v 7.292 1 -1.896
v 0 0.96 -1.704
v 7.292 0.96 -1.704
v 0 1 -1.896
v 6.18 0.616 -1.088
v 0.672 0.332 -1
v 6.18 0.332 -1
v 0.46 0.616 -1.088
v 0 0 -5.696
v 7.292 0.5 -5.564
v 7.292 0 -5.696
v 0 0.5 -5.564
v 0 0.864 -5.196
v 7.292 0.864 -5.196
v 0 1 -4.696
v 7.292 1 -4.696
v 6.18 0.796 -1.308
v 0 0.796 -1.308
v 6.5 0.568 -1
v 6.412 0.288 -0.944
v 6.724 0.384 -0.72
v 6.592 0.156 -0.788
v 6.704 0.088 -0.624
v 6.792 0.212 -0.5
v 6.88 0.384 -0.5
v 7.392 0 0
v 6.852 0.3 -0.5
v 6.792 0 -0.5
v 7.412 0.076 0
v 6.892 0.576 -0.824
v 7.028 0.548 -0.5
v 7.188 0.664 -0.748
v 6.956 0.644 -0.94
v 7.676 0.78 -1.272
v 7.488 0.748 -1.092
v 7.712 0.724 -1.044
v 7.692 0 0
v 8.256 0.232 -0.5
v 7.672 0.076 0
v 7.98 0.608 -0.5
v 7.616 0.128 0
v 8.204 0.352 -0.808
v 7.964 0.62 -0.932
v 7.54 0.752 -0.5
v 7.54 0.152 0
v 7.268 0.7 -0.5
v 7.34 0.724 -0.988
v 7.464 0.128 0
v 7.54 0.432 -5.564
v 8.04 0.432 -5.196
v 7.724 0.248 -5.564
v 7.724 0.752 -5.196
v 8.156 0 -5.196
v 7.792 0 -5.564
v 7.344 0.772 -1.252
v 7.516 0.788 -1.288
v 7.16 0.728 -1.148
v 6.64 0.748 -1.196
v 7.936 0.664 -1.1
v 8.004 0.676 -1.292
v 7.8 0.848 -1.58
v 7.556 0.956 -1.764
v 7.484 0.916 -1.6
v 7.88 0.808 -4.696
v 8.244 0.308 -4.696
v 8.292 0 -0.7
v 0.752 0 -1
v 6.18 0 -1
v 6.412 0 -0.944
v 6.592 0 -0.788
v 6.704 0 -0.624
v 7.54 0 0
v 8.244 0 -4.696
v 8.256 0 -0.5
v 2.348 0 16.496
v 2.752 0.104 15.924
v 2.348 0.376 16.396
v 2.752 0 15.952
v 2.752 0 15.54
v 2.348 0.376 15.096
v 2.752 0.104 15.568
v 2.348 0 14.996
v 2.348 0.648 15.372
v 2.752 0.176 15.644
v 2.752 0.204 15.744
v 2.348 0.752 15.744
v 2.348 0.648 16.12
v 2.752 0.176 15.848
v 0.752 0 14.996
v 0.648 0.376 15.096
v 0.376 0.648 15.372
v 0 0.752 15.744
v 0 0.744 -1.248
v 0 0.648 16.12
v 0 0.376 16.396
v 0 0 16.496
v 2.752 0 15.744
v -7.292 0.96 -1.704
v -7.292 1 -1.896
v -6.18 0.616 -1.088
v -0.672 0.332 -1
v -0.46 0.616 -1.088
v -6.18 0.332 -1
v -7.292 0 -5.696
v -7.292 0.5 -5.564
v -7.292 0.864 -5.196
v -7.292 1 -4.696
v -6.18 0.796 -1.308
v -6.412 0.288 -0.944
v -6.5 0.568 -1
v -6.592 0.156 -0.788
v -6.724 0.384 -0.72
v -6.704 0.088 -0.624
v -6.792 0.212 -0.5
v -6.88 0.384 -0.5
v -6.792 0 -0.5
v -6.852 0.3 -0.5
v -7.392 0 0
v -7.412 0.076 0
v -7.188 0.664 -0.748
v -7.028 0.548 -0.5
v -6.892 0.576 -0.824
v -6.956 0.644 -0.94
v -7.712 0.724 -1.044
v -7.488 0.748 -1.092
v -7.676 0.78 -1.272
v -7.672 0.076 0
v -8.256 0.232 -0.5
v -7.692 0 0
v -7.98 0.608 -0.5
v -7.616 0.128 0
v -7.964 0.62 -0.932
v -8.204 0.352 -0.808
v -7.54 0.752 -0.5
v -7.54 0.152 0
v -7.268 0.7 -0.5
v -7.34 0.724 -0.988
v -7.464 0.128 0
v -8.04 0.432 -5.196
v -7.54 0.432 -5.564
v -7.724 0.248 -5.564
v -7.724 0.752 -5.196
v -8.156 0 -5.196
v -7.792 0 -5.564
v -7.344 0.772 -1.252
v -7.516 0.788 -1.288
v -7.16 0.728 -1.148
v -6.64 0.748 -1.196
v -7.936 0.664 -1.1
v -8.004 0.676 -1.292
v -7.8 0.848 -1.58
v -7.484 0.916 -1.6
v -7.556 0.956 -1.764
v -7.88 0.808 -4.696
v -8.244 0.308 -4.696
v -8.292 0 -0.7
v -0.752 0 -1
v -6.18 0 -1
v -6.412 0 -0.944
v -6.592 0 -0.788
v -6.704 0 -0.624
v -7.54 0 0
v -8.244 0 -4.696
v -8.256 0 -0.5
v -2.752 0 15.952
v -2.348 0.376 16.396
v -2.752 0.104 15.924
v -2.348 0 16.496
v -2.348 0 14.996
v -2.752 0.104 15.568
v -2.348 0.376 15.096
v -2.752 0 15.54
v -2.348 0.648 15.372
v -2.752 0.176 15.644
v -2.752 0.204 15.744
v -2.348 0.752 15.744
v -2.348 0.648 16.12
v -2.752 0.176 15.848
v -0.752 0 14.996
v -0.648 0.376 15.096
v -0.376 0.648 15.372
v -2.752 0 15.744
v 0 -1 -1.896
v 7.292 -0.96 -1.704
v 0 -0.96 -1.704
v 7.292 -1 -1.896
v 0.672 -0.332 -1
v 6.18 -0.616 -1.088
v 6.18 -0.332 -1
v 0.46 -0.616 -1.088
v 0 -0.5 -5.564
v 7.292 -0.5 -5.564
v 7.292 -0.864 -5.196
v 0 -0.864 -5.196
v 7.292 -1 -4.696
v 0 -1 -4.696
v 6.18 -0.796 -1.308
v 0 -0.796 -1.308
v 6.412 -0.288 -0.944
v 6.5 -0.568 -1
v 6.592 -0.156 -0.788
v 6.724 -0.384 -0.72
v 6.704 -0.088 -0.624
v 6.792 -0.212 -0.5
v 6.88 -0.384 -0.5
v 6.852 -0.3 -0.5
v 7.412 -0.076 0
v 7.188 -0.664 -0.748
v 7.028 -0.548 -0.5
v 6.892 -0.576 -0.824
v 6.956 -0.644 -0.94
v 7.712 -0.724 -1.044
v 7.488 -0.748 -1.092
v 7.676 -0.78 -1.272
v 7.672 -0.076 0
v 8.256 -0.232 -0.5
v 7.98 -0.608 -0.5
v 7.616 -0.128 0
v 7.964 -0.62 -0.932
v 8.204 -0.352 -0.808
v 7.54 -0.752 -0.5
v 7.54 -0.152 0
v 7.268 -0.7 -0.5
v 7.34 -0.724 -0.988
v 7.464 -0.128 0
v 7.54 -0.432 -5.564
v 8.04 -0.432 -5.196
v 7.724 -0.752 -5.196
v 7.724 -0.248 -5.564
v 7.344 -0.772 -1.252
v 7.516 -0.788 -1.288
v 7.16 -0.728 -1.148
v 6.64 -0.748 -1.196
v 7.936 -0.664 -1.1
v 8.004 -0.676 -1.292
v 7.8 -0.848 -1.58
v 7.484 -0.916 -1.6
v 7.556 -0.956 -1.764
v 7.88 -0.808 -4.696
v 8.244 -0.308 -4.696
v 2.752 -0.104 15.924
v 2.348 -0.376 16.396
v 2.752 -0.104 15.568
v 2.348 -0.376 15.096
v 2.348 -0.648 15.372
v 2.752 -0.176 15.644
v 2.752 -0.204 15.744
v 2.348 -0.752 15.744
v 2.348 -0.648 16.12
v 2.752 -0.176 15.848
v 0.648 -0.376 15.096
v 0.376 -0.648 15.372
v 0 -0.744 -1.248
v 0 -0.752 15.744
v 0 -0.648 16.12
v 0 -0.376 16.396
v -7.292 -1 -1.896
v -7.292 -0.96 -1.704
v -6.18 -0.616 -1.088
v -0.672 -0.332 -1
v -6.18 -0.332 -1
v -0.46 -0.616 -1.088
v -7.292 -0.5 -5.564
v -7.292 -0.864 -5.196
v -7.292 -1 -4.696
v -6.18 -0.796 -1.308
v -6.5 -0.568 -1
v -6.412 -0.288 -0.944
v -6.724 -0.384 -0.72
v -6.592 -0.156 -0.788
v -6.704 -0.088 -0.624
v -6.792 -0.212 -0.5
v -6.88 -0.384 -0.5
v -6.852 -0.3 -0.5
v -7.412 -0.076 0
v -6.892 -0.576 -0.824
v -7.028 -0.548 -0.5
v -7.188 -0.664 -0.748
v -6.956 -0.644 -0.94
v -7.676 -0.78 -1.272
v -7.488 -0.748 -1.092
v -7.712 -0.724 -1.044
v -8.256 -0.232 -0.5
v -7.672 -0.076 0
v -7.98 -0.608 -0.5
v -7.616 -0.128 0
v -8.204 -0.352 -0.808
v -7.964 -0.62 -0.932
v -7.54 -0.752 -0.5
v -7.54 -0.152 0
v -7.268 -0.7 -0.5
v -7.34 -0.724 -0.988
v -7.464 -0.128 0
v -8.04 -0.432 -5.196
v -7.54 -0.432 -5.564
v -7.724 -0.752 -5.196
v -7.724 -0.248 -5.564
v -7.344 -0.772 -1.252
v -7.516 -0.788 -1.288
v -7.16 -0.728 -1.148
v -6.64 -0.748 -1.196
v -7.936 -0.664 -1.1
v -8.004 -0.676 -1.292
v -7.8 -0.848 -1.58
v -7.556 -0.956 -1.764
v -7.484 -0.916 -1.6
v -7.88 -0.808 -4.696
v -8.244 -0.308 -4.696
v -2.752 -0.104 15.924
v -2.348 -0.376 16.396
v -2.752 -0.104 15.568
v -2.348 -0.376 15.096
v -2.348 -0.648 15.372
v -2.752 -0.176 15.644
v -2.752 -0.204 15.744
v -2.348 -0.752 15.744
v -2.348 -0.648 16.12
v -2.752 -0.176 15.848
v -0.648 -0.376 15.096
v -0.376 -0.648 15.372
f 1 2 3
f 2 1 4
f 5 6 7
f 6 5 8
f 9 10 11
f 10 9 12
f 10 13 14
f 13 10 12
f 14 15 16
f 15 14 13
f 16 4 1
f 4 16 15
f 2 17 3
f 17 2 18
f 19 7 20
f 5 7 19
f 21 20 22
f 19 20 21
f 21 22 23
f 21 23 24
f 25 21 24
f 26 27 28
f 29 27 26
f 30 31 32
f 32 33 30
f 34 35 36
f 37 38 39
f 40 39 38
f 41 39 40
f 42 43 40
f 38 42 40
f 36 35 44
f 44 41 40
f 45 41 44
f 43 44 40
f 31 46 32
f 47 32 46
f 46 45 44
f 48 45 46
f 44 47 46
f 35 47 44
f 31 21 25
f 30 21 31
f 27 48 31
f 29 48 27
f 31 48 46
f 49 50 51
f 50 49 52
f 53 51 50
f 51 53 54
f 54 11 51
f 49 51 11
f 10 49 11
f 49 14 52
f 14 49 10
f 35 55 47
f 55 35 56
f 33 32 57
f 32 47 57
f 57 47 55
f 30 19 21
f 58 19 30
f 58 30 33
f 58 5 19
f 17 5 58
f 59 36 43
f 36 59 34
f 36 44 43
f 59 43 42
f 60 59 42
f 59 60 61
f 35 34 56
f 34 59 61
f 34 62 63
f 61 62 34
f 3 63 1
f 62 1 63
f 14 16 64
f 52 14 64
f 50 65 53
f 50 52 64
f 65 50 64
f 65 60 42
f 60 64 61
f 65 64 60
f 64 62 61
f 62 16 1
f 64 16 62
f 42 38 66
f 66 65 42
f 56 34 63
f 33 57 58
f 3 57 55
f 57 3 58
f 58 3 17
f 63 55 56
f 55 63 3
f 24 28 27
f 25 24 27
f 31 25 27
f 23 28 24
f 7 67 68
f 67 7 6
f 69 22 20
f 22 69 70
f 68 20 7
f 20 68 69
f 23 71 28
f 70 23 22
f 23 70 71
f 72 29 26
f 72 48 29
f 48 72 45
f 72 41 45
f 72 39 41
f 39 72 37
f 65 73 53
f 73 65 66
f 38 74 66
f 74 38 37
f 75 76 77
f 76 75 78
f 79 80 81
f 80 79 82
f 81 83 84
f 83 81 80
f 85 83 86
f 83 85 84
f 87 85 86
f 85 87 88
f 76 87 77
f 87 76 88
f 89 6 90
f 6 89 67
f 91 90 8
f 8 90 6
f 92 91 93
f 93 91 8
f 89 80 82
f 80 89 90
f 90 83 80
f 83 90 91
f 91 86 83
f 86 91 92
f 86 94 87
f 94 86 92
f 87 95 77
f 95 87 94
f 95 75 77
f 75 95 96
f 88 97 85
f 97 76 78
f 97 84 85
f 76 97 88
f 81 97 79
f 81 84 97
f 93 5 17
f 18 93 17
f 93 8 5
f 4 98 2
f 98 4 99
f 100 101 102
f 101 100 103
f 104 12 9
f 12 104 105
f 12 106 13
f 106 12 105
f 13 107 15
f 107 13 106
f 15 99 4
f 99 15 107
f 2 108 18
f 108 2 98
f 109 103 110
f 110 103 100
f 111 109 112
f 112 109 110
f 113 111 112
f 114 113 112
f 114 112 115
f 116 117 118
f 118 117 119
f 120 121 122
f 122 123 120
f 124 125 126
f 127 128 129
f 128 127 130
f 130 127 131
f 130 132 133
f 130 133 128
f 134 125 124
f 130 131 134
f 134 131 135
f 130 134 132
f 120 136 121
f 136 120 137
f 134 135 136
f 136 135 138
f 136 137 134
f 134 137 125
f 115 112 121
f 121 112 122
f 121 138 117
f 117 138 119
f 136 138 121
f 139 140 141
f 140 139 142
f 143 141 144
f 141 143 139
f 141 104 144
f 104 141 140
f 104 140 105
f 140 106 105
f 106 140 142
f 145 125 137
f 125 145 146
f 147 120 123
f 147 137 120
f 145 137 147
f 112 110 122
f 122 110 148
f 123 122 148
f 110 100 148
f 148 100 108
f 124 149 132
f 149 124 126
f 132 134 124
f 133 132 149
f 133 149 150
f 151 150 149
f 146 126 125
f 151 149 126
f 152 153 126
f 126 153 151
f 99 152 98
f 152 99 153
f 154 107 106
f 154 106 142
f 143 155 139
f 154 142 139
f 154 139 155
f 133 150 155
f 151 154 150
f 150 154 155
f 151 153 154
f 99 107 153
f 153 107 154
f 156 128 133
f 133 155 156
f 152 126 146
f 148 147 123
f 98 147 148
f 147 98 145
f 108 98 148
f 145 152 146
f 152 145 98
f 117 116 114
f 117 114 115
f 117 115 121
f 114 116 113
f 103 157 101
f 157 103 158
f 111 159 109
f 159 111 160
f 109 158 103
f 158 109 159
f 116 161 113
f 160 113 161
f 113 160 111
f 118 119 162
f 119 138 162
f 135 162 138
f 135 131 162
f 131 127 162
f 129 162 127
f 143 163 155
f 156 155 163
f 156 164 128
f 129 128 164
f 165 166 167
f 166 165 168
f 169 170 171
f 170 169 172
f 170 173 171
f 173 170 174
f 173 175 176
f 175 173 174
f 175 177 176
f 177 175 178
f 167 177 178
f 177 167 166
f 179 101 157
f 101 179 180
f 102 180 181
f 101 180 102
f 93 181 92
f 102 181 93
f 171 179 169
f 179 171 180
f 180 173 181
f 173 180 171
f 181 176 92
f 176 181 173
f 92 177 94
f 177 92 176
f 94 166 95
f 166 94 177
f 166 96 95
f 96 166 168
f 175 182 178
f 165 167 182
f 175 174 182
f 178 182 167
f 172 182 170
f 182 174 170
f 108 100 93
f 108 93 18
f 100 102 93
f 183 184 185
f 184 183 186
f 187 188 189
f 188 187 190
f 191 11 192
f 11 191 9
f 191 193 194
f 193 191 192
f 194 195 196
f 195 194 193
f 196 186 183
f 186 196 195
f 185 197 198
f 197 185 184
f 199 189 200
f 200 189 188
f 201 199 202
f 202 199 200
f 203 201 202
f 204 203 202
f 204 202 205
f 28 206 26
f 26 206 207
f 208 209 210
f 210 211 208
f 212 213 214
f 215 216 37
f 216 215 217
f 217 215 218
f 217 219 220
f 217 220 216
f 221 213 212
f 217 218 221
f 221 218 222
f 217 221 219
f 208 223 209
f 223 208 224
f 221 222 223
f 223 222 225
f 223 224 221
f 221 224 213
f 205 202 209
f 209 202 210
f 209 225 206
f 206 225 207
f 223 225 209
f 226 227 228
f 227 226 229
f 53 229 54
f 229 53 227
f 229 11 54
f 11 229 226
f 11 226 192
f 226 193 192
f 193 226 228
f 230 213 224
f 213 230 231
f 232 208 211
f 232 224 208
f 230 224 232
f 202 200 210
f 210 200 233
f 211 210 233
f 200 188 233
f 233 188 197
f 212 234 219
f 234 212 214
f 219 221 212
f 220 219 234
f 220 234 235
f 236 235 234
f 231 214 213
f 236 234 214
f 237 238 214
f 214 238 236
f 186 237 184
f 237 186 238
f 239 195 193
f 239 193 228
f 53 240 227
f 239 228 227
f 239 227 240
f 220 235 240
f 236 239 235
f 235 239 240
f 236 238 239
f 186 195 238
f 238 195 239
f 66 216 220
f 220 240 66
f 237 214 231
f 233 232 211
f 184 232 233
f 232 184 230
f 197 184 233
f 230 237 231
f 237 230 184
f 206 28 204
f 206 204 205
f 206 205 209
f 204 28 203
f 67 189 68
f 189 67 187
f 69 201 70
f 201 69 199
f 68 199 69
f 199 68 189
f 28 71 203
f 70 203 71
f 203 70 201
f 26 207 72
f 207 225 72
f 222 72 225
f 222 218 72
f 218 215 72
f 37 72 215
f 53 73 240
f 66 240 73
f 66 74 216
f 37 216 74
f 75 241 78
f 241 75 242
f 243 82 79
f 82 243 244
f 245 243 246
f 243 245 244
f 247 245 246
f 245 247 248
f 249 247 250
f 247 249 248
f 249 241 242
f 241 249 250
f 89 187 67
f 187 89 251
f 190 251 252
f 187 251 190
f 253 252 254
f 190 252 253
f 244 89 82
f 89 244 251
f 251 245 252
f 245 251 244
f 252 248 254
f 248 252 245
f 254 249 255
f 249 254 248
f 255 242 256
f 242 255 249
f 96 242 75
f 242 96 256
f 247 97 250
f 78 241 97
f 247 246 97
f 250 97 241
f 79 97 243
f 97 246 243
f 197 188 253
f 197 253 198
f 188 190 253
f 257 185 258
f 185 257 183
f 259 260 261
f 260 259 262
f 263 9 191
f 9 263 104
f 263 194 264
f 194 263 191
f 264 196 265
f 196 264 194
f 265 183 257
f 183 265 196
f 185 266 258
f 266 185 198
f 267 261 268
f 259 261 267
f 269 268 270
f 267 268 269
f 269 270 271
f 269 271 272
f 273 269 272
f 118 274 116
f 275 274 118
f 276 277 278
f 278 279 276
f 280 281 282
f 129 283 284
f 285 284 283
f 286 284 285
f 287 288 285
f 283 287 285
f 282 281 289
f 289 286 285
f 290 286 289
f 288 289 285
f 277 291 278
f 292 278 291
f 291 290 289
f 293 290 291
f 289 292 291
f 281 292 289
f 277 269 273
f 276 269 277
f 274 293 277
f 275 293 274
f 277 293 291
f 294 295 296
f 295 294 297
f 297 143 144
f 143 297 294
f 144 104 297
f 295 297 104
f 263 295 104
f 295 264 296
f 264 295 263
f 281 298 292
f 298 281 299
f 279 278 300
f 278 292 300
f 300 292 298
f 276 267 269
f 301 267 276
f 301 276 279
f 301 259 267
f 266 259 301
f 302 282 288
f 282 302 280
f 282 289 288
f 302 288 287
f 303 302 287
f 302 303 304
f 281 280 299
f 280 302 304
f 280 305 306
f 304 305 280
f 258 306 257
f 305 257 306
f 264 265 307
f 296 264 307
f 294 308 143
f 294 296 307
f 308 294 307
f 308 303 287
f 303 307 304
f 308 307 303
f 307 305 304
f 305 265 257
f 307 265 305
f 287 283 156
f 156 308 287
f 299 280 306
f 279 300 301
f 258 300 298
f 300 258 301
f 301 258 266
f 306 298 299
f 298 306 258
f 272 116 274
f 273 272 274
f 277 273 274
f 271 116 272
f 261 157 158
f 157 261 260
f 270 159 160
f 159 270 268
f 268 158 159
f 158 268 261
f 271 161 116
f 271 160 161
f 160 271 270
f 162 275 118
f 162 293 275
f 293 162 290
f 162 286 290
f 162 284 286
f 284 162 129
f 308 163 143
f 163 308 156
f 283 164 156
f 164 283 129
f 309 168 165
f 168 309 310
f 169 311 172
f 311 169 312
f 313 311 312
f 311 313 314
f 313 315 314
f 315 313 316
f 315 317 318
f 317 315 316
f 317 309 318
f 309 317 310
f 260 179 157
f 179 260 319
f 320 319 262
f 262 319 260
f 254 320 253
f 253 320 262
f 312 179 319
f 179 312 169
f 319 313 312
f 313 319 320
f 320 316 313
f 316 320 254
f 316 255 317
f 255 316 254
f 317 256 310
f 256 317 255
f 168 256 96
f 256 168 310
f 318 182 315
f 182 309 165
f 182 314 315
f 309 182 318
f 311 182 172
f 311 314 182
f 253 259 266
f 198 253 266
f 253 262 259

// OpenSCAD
use <../lib.scad>
use <s/40359bs01.scad>
$fa=1; $fs=0.2;
function ldraw_lib__40359b(realsolid=false) = [
// 0 ~Sprue for 2 Minifig Keys
// 0 Name: 40359b.dat
// 0 Author: Andy Westrate [westrate]
// 0 !LDRAW_ORG Part UPDATE 2020-02
// 0 !LICENSE Licensed under CC BY 2.0 and CC BY 4.0 : see CAreadme.txt
// 
// 0 BFC CERTIFY CCW
  [0,"BFC","CERTIFY"],
  [0,"BFC","CCW"],
// 
// 0 !CATEGORY Minifig Accessory
// 
// 0 !HISTORY 2009-10-13 {LEGO Universe Team} Original part shape
// 0 !HISTORY 2009-11-12 [westrate] File preparation for LDraw Parts Tracker
// 0 !HISTORY 2020-06-28 [PTadmin] Official Update 2020-01
// 0 !HISTORY 2020-08-05 [PTadmin] Renamed from 62809
// 0 !HISTORY 2020-09-05 [PTadmin] Official Update 2020-02
// 
// 
// 1 16 0 0 0 1 0 0 0 1 0 0 0 1 s\40359bs01.dat
  [1,16,0,0,0,1,0,0,0,1,0,0,0,1, ldraw_lib__s__40359bs01(realsolid)],
// 1 16 0 0 0 -1 0 0 0 1 0 0 0 1 s\40359bs01.dat
  [1,16,0,0,0,-1,0,0,0,1,0,0,0,1, ldraw_lib__s__40359bs01(realsolid)],
// 1 16 0 0 0 1 0 0 0 1 0 0 0 -1 s\40359bs01.dat
  [1,16,0,0,0,1,0,0,0,1,0,0,0,-1, ldraw_lib__s__40359bs01(realsolid)],
// 1 16 0 0 0 -1 0 0 0 1 0 0 0 -1 s\40359bs01.dat
  [1,16,0,0,0,-1,0,0,0,1,0,0,0,-1, ldraw_lib__s__40359bs01(realsolid)],
// 0
];
module ldraw_lib__40359b(step=0, col=false, unit=2/5, alt=false, line=0.2, solid=!$preview)
    makepoly(ldraw_lib__40359b(solid), step=step, col=col, unit=unit, alt=alt, line=line, solid=solid);
ldraw_lib__40359b(line=0.2);
